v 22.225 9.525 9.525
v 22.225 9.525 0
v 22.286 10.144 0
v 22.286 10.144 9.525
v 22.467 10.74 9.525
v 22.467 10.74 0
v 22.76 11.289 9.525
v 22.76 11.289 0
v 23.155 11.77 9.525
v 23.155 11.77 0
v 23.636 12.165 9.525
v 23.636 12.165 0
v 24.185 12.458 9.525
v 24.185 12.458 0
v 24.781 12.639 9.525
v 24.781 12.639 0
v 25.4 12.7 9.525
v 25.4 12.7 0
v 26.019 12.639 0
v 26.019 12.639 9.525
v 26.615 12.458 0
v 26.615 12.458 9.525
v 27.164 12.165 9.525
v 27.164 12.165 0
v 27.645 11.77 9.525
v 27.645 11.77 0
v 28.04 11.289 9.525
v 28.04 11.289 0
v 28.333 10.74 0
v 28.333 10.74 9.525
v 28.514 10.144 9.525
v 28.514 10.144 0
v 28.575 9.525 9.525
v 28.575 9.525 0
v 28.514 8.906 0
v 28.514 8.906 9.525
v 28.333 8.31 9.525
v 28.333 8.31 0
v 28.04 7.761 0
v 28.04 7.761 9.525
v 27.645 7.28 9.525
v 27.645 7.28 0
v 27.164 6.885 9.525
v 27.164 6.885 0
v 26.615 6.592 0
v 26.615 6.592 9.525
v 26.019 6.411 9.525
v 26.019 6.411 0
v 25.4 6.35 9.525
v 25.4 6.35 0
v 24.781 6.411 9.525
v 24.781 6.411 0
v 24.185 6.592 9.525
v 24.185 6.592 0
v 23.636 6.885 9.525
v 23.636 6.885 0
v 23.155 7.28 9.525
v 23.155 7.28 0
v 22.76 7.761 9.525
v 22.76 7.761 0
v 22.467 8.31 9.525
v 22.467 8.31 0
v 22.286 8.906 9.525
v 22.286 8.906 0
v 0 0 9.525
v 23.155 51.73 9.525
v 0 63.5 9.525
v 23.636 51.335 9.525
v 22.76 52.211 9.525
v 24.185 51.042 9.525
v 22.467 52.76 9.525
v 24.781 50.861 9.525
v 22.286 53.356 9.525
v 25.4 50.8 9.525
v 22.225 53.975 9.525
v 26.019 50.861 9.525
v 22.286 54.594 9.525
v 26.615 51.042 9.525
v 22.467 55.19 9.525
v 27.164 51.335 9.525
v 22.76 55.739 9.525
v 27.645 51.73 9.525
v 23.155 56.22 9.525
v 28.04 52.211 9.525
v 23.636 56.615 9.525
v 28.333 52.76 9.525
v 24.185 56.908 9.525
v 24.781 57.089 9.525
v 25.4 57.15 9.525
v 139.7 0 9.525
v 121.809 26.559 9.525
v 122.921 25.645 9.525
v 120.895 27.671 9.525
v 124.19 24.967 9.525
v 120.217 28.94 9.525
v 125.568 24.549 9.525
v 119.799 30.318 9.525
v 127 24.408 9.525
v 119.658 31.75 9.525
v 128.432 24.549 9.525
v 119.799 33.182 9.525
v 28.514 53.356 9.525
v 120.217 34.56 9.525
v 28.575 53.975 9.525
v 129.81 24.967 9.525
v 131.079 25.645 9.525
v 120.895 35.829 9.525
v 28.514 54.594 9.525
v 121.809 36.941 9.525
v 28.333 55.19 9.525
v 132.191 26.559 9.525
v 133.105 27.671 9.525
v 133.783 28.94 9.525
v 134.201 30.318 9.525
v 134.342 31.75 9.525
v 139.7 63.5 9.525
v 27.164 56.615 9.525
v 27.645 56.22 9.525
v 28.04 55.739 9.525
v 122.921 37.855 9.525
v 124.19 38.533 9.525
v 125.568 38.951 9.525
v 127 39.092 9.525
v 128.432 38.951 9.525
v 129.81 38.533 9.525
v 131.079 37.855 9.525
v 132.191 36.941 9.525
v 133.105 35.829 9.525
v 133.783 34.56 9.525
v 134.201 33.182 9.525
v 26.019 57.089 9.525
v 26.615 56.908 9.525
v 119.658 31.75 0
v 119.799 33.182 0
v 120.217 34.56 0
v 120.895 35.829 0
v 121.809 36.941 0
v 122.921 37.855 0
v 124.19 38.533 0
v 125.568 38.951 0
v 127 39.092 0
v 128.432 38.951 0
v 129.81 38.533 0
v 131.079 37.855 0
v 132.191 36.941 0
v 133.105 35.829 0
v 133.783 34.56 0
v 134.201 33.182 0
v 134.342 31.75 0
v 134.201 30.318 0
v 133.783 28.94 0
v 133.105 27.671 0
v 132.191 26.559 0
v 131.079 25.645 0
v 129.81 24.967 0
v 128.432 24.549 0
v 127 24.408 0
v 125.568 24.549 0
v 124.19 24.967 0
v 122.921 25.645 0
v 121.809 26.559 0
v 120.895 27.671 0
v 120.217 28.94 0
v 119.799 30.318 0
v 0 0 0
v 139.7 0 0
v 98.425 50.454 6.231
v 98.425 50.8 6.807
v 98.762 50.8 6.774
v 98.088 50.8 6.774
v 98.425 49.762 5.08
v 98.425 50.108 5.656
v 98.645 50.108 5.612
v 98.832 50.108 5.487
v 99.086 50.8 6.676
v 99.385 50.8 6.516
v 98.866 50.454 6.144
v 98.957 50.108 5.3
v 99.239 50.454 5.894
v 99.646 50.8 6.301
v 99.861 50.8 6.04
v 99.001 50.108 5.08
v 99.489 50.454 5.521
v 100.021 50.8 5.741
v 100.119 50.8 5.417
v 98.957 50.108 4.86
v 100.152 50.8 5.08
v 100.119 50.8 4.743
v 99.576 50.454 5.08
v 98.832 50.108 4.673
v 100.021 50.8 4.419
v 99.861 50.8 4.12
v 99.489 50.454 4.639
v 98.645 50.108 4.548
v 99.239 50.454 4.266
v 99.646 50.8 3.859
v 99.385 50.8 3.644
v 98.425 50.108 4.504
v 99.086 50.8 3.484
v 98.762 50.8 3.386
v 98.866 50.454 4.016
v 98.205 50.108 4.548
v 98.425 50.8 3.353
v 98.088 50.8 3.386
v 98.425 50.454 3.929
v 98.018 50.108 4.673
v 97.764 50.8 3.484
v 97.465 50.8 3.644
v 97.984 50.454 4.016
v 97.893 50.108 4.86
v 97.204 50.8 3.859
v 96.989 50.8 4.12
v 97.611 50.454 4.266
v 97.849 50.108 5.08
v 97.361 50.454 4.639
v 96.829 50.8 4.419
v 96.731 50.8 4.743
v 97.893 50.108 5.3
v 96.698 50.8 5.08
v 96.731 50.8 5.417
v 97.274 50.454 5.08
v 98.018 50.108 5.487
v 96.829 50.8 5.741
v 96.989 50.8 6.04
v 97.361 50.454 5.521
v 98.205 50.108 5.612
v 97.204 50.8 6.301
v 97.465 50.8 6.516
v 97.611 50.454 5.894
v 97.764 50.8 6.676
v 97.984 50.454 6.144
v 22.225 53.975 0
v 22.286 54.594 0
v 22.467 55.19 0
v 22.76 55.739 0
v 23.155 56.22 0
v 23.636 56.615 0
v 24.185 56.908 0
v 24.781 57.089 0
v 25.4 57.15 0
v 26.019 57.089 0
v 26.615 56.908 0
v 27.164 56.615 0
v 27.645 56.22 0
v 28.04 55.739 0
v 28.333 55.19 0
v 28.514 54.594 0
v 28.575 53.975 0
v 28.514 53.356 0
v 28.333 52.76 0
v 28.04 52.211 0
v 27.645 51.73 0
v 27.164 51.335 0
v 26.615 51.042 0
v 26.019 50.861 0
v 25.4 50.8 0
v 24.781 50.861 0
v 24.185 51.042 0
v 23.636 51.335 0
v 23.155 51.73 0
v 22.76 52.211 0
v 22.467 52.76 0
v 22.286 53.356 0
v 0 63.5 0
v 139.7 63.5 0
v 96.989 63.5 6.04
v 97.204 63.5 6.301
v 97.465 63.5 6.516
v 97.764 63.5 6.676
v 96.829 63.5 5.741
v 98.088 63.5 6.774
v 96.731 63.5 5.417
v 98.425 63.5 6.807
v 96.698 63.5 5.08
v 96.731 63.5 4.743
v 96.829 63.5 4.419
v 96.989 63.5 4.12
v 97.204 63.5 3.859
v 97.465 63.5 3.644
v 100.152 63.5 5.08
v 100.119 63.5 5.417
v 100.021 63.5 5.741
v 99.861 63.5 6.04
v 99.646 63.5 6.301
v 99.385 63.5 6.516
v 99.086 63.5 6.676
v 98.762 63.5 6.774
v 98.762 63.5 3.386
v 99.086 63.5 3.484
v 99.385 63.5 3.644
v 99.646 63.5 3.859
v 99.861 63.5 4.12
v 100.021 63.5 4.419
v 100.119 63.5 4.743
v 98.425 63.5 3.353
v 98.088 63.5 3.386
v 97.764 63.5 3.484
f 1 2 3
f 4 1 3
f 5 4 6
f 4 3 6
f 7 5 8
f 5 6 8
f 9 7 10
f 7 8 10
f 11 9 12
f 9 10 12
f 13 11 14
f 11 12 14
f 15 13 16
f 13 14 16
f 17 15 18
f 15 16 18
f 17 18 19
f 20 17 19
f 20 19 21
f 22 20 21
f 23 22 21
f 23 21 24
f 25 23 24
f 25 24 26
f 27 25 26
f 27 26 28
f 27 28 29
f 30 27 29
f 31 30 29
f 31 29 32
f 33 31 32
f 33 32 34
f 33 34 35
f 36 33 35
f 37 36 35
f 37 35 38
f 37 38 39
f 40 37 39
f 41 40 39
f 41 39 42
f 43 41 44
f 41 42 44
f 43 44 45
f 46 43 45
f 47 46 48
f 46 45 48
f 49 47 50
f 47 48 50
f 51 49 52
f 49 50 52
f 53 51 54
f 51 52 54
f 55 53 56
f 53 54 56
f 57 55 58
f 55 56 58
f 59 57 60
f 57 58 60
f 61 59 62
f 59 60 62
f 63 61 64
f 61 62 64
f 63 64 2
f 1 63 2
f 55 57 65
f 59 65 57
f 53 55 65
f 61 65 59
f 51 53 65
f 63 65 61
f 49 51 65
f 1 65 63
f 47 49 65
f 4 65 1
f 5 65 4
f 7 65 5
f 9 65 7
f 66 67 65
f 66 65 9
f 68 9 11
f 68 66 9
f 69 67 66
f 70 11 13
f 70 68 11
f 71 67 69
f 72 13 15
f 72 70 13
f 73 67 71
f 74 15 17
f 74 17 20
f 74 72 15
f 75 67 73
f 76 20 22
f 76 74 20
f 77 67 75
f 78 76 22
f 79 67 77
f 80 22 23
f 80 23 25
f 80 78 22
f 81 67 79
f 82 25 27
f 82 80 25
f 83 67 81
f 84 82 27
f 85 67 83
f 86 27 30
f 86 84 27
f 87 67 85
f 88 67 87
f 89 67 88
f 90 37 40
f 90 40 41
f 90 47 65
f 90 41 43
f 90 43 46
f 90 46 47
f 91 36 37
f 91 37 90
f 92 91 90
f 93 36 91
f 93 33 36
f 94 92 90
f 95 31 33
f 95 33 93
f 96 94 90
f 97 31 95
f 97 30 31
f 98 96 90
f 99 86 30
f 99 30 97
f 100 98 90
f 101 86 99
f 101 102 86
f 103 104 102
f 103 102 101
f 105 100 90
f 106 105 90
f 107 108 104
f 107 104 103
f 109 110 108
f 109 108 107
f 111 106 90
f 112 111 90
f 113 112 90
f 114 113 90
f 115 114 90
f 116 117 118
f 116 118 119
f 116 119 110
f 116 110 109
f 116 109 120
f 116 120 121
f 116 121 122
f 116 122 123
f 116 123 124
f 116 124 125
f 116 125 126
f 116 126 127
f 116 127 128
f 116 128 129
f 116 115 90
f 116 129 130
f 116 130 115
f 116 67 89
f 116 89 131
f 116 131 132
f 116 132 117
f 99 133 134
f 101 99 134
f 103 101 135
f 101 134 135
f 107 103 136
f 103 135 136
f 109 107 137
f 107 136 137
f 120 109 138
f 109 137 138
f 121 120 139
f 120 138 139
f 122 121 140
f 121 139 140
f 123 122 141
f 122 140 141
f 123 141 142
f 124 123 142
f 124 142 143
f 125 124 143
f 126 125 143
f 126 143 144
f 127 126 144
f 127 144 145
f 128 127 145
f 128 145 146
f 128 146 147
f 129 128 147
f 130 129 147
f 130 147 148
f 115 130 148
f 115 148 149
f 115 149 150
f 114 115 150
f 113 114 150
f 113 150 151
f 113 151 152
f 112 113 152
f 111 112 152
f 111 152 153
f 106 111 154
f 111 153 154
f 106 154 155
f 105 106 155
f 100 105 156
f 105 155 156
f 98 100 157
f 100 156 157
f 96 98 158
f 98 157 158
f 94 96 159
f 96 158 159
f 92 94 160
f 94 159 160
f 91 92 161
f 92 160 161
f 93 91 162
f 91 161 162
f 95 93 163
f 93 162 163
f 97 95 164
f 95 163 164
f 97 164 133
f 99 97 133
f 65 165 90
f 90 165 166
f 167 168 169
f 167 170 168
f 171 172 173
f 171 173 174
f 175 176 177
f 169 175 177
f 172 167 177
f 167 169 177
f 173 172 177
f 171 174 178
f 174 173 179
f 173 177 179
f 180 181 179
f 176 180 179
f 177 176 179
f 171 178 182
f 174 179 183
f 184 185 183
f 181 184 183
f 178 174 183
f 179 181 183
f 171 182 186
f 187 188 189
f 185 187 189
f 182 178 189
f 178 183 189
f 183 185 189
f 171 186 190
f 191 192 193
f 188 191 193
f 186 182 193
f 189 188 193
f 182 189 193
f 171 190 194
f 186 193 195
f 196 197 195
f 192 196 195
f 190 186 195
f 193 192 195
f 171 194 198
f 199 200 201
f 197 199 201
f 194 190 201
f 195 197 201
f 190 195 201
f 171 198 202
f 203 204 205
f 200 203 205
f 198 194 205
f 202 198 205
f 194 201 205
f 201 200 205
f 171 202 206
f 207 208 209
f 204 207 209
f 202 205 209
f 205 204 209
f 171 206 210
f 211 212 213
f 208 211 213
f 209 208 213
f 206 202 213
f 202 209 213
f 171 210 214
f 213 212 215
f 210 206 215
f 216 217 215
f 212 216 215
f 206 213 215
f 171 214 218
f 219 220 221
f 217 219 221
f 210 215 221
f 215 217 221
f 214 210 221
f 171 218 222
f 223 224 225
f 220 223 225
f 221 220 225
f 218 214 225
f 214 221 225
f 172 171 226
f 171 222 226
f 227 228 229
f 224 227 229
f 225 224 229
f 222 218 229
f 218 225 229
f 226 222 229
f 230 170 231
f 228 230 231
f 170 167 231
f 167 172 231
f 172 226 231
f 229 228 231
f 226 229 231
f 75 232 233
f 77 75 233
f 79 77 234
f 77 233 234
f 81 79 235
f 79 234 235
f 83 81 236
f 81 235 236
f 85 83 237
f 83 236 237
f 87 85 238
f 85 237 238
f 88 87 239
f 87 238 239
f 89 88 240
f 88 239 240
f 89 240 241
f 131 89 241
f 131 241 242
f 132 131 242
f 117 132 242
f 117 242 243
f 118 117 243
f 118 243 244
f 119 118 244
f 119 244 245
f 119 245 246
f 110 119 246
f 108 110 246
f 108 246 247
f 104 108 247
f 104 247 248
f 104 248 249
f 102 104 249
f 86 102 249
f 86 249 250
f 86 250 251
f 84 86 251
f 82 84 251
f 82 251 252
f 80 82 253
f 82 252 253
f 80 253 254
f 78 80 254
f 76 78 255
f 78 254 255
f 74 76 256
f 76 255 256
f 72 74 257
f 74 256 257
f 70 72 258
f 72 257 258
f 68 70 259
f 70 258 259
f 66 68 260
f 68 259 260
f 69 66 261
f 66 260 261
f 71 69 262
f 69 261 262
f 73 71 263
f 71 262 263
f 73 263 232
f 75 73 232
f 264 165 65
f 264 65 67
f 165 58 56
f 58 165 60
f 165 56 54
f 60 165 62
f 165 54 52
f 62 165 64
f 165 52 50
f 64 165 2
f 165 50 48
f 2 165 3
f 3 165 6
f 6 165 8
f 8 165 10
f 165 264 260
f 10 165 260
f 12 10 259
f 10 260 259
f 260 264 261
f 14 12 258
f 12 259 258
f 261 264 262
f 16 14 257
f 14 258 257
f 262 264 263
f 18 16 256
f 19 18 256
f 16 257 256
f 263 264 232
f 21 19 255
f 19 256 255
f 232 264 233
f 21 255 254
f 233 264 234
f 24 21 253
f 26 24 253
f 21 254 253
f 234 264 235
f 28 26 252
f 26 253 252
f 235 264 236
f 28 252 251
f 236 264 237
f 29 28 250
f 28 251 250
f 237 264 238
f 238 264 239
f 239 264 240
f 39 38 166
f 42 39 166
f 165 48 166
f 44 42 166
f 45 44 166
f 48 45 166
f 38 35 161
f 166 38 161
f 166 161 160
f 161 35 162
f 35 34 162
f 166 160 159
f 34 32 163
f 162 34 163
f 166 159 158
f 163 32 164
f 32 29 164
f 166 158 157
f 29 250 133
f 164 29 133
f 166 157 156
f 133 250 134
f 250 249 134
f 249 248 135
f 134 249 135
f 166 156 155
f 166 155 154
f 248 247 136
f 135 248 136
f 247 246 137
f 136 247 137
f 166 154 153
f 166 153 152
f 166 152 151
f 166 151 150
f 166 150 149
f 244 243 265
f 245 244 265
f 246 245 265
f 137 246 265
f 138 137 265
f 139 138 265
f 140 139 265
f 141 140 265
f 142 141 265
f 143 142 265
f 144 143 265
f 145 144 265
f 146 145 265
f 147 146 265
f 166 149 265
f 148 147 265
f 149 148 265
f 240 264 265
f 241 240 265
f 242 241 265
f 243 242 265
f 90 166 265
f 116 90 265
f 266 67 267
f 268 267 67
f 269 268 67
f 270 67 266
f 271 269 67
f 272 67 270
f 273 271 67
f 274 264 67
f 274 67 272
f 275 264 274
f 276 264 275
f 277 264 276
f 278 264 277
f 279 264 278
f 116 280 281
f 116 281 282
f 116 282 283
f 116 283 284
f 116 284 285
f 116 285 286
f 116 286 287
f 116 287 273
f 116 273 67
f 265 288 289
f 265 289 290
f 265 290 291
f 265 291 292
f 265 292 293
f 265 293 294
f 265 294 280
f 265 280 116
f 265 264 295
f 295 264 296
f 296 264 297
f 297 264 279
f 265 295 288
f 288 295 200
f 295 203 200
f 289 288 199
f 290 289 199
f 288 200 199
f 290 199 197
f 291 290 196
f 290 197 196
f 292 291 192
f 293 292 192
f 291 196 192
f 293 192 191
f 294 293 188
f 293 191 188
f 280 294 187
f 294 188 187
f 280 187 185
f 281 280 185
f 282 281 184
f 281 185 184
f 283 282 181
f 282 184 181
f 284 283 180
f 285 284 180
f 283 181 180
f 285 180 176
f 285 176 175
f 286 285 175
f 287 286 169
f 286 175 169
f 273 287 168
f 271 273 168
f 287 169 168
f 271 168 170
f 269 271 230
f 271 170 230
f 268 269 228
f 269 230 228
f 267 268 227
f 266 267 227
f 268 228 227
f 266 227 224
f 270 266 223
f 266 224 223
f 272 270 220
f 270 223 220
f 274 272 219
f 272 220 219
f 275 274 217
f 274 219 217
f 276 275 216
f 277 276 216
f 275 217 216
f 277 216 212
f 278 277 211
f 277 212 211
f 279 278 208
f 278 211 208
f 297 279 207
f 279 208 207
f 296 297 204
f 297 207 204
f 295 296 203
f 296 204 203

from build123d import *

# Parameters (mm, degrees)
SKETCH1_W                   = 139.7
SKETCH1_H                   = 63.5
BOSS_EXTRUDE1_DEPTH         = 9.525
F_5_8_18_TAPPED_HOLE1_D     = 14.68374
F_1_4_0_25_DIAMETER_HOLE1_D = 6.35
F_8_32_TAPPED_HOLE1_D       = 3.4544
F_8_32_TAPPED_HOLE1_DEPTH   = 12.7
F_8_32_TAPPED_HOLE1_TIP     = 1.037806461


with BuildPart() as part:
    # Sketch1 → Boss-Extrude1 (new body)
    with BuildSketch(Plane.XY):
        with Locations((69.85, 31.75)):
            Rectangle(SKETCH1_W, SKETCH1_H)
    extrude(amount=BOSS_EXTRUDE1_DEPTH)

    # 5/8-18 Tapped Hole1 (through all)
    with Locations(Plane.XY.offset(9.525)):
        with Locations((127, 31.75)):
            Hole(F_5_8_18_TAPPED_HOLE1_D / 2)

    # 1/4 (0.25) Diameter Hole1 (through all)
    with Locations(Plane(origin=(25.4, 53.975, 9.525), x_dir=(1, 0, 0), z_dir=(0, 0, 1))):
        with Locations((0, 0), (0, -44.45)):
            Hole(F_1_4_0_25_DIAMETER_HOLE1_D / 2)

    # #8-32 Tapped Hole1
    with Locations(Plane(origin=(98.425, 63.5, 5.08), x_dir=(0, 0, 1), z_dir=(0, 1, 0))):
        with Locations((0, 0)):
            Hole(F_8_32_TAPPED_HOLE1_D / 2, depth=F_8_32_TAPPED_HOLE1_DEPTH)
            with Locations((0, 0, -(F_8_32_TAPPED_HOLE1_DEPTH + F_8_32_TAPPED_HOLE1_TIP / 2))):  # 118° drill point
                Cone(0, F_8_32_TAPPED_HOLE1_D / 2, F_8_32_TAPPED_HOLE1_TIP, mode=Mode.SUBTRACT)


solid = part.part
